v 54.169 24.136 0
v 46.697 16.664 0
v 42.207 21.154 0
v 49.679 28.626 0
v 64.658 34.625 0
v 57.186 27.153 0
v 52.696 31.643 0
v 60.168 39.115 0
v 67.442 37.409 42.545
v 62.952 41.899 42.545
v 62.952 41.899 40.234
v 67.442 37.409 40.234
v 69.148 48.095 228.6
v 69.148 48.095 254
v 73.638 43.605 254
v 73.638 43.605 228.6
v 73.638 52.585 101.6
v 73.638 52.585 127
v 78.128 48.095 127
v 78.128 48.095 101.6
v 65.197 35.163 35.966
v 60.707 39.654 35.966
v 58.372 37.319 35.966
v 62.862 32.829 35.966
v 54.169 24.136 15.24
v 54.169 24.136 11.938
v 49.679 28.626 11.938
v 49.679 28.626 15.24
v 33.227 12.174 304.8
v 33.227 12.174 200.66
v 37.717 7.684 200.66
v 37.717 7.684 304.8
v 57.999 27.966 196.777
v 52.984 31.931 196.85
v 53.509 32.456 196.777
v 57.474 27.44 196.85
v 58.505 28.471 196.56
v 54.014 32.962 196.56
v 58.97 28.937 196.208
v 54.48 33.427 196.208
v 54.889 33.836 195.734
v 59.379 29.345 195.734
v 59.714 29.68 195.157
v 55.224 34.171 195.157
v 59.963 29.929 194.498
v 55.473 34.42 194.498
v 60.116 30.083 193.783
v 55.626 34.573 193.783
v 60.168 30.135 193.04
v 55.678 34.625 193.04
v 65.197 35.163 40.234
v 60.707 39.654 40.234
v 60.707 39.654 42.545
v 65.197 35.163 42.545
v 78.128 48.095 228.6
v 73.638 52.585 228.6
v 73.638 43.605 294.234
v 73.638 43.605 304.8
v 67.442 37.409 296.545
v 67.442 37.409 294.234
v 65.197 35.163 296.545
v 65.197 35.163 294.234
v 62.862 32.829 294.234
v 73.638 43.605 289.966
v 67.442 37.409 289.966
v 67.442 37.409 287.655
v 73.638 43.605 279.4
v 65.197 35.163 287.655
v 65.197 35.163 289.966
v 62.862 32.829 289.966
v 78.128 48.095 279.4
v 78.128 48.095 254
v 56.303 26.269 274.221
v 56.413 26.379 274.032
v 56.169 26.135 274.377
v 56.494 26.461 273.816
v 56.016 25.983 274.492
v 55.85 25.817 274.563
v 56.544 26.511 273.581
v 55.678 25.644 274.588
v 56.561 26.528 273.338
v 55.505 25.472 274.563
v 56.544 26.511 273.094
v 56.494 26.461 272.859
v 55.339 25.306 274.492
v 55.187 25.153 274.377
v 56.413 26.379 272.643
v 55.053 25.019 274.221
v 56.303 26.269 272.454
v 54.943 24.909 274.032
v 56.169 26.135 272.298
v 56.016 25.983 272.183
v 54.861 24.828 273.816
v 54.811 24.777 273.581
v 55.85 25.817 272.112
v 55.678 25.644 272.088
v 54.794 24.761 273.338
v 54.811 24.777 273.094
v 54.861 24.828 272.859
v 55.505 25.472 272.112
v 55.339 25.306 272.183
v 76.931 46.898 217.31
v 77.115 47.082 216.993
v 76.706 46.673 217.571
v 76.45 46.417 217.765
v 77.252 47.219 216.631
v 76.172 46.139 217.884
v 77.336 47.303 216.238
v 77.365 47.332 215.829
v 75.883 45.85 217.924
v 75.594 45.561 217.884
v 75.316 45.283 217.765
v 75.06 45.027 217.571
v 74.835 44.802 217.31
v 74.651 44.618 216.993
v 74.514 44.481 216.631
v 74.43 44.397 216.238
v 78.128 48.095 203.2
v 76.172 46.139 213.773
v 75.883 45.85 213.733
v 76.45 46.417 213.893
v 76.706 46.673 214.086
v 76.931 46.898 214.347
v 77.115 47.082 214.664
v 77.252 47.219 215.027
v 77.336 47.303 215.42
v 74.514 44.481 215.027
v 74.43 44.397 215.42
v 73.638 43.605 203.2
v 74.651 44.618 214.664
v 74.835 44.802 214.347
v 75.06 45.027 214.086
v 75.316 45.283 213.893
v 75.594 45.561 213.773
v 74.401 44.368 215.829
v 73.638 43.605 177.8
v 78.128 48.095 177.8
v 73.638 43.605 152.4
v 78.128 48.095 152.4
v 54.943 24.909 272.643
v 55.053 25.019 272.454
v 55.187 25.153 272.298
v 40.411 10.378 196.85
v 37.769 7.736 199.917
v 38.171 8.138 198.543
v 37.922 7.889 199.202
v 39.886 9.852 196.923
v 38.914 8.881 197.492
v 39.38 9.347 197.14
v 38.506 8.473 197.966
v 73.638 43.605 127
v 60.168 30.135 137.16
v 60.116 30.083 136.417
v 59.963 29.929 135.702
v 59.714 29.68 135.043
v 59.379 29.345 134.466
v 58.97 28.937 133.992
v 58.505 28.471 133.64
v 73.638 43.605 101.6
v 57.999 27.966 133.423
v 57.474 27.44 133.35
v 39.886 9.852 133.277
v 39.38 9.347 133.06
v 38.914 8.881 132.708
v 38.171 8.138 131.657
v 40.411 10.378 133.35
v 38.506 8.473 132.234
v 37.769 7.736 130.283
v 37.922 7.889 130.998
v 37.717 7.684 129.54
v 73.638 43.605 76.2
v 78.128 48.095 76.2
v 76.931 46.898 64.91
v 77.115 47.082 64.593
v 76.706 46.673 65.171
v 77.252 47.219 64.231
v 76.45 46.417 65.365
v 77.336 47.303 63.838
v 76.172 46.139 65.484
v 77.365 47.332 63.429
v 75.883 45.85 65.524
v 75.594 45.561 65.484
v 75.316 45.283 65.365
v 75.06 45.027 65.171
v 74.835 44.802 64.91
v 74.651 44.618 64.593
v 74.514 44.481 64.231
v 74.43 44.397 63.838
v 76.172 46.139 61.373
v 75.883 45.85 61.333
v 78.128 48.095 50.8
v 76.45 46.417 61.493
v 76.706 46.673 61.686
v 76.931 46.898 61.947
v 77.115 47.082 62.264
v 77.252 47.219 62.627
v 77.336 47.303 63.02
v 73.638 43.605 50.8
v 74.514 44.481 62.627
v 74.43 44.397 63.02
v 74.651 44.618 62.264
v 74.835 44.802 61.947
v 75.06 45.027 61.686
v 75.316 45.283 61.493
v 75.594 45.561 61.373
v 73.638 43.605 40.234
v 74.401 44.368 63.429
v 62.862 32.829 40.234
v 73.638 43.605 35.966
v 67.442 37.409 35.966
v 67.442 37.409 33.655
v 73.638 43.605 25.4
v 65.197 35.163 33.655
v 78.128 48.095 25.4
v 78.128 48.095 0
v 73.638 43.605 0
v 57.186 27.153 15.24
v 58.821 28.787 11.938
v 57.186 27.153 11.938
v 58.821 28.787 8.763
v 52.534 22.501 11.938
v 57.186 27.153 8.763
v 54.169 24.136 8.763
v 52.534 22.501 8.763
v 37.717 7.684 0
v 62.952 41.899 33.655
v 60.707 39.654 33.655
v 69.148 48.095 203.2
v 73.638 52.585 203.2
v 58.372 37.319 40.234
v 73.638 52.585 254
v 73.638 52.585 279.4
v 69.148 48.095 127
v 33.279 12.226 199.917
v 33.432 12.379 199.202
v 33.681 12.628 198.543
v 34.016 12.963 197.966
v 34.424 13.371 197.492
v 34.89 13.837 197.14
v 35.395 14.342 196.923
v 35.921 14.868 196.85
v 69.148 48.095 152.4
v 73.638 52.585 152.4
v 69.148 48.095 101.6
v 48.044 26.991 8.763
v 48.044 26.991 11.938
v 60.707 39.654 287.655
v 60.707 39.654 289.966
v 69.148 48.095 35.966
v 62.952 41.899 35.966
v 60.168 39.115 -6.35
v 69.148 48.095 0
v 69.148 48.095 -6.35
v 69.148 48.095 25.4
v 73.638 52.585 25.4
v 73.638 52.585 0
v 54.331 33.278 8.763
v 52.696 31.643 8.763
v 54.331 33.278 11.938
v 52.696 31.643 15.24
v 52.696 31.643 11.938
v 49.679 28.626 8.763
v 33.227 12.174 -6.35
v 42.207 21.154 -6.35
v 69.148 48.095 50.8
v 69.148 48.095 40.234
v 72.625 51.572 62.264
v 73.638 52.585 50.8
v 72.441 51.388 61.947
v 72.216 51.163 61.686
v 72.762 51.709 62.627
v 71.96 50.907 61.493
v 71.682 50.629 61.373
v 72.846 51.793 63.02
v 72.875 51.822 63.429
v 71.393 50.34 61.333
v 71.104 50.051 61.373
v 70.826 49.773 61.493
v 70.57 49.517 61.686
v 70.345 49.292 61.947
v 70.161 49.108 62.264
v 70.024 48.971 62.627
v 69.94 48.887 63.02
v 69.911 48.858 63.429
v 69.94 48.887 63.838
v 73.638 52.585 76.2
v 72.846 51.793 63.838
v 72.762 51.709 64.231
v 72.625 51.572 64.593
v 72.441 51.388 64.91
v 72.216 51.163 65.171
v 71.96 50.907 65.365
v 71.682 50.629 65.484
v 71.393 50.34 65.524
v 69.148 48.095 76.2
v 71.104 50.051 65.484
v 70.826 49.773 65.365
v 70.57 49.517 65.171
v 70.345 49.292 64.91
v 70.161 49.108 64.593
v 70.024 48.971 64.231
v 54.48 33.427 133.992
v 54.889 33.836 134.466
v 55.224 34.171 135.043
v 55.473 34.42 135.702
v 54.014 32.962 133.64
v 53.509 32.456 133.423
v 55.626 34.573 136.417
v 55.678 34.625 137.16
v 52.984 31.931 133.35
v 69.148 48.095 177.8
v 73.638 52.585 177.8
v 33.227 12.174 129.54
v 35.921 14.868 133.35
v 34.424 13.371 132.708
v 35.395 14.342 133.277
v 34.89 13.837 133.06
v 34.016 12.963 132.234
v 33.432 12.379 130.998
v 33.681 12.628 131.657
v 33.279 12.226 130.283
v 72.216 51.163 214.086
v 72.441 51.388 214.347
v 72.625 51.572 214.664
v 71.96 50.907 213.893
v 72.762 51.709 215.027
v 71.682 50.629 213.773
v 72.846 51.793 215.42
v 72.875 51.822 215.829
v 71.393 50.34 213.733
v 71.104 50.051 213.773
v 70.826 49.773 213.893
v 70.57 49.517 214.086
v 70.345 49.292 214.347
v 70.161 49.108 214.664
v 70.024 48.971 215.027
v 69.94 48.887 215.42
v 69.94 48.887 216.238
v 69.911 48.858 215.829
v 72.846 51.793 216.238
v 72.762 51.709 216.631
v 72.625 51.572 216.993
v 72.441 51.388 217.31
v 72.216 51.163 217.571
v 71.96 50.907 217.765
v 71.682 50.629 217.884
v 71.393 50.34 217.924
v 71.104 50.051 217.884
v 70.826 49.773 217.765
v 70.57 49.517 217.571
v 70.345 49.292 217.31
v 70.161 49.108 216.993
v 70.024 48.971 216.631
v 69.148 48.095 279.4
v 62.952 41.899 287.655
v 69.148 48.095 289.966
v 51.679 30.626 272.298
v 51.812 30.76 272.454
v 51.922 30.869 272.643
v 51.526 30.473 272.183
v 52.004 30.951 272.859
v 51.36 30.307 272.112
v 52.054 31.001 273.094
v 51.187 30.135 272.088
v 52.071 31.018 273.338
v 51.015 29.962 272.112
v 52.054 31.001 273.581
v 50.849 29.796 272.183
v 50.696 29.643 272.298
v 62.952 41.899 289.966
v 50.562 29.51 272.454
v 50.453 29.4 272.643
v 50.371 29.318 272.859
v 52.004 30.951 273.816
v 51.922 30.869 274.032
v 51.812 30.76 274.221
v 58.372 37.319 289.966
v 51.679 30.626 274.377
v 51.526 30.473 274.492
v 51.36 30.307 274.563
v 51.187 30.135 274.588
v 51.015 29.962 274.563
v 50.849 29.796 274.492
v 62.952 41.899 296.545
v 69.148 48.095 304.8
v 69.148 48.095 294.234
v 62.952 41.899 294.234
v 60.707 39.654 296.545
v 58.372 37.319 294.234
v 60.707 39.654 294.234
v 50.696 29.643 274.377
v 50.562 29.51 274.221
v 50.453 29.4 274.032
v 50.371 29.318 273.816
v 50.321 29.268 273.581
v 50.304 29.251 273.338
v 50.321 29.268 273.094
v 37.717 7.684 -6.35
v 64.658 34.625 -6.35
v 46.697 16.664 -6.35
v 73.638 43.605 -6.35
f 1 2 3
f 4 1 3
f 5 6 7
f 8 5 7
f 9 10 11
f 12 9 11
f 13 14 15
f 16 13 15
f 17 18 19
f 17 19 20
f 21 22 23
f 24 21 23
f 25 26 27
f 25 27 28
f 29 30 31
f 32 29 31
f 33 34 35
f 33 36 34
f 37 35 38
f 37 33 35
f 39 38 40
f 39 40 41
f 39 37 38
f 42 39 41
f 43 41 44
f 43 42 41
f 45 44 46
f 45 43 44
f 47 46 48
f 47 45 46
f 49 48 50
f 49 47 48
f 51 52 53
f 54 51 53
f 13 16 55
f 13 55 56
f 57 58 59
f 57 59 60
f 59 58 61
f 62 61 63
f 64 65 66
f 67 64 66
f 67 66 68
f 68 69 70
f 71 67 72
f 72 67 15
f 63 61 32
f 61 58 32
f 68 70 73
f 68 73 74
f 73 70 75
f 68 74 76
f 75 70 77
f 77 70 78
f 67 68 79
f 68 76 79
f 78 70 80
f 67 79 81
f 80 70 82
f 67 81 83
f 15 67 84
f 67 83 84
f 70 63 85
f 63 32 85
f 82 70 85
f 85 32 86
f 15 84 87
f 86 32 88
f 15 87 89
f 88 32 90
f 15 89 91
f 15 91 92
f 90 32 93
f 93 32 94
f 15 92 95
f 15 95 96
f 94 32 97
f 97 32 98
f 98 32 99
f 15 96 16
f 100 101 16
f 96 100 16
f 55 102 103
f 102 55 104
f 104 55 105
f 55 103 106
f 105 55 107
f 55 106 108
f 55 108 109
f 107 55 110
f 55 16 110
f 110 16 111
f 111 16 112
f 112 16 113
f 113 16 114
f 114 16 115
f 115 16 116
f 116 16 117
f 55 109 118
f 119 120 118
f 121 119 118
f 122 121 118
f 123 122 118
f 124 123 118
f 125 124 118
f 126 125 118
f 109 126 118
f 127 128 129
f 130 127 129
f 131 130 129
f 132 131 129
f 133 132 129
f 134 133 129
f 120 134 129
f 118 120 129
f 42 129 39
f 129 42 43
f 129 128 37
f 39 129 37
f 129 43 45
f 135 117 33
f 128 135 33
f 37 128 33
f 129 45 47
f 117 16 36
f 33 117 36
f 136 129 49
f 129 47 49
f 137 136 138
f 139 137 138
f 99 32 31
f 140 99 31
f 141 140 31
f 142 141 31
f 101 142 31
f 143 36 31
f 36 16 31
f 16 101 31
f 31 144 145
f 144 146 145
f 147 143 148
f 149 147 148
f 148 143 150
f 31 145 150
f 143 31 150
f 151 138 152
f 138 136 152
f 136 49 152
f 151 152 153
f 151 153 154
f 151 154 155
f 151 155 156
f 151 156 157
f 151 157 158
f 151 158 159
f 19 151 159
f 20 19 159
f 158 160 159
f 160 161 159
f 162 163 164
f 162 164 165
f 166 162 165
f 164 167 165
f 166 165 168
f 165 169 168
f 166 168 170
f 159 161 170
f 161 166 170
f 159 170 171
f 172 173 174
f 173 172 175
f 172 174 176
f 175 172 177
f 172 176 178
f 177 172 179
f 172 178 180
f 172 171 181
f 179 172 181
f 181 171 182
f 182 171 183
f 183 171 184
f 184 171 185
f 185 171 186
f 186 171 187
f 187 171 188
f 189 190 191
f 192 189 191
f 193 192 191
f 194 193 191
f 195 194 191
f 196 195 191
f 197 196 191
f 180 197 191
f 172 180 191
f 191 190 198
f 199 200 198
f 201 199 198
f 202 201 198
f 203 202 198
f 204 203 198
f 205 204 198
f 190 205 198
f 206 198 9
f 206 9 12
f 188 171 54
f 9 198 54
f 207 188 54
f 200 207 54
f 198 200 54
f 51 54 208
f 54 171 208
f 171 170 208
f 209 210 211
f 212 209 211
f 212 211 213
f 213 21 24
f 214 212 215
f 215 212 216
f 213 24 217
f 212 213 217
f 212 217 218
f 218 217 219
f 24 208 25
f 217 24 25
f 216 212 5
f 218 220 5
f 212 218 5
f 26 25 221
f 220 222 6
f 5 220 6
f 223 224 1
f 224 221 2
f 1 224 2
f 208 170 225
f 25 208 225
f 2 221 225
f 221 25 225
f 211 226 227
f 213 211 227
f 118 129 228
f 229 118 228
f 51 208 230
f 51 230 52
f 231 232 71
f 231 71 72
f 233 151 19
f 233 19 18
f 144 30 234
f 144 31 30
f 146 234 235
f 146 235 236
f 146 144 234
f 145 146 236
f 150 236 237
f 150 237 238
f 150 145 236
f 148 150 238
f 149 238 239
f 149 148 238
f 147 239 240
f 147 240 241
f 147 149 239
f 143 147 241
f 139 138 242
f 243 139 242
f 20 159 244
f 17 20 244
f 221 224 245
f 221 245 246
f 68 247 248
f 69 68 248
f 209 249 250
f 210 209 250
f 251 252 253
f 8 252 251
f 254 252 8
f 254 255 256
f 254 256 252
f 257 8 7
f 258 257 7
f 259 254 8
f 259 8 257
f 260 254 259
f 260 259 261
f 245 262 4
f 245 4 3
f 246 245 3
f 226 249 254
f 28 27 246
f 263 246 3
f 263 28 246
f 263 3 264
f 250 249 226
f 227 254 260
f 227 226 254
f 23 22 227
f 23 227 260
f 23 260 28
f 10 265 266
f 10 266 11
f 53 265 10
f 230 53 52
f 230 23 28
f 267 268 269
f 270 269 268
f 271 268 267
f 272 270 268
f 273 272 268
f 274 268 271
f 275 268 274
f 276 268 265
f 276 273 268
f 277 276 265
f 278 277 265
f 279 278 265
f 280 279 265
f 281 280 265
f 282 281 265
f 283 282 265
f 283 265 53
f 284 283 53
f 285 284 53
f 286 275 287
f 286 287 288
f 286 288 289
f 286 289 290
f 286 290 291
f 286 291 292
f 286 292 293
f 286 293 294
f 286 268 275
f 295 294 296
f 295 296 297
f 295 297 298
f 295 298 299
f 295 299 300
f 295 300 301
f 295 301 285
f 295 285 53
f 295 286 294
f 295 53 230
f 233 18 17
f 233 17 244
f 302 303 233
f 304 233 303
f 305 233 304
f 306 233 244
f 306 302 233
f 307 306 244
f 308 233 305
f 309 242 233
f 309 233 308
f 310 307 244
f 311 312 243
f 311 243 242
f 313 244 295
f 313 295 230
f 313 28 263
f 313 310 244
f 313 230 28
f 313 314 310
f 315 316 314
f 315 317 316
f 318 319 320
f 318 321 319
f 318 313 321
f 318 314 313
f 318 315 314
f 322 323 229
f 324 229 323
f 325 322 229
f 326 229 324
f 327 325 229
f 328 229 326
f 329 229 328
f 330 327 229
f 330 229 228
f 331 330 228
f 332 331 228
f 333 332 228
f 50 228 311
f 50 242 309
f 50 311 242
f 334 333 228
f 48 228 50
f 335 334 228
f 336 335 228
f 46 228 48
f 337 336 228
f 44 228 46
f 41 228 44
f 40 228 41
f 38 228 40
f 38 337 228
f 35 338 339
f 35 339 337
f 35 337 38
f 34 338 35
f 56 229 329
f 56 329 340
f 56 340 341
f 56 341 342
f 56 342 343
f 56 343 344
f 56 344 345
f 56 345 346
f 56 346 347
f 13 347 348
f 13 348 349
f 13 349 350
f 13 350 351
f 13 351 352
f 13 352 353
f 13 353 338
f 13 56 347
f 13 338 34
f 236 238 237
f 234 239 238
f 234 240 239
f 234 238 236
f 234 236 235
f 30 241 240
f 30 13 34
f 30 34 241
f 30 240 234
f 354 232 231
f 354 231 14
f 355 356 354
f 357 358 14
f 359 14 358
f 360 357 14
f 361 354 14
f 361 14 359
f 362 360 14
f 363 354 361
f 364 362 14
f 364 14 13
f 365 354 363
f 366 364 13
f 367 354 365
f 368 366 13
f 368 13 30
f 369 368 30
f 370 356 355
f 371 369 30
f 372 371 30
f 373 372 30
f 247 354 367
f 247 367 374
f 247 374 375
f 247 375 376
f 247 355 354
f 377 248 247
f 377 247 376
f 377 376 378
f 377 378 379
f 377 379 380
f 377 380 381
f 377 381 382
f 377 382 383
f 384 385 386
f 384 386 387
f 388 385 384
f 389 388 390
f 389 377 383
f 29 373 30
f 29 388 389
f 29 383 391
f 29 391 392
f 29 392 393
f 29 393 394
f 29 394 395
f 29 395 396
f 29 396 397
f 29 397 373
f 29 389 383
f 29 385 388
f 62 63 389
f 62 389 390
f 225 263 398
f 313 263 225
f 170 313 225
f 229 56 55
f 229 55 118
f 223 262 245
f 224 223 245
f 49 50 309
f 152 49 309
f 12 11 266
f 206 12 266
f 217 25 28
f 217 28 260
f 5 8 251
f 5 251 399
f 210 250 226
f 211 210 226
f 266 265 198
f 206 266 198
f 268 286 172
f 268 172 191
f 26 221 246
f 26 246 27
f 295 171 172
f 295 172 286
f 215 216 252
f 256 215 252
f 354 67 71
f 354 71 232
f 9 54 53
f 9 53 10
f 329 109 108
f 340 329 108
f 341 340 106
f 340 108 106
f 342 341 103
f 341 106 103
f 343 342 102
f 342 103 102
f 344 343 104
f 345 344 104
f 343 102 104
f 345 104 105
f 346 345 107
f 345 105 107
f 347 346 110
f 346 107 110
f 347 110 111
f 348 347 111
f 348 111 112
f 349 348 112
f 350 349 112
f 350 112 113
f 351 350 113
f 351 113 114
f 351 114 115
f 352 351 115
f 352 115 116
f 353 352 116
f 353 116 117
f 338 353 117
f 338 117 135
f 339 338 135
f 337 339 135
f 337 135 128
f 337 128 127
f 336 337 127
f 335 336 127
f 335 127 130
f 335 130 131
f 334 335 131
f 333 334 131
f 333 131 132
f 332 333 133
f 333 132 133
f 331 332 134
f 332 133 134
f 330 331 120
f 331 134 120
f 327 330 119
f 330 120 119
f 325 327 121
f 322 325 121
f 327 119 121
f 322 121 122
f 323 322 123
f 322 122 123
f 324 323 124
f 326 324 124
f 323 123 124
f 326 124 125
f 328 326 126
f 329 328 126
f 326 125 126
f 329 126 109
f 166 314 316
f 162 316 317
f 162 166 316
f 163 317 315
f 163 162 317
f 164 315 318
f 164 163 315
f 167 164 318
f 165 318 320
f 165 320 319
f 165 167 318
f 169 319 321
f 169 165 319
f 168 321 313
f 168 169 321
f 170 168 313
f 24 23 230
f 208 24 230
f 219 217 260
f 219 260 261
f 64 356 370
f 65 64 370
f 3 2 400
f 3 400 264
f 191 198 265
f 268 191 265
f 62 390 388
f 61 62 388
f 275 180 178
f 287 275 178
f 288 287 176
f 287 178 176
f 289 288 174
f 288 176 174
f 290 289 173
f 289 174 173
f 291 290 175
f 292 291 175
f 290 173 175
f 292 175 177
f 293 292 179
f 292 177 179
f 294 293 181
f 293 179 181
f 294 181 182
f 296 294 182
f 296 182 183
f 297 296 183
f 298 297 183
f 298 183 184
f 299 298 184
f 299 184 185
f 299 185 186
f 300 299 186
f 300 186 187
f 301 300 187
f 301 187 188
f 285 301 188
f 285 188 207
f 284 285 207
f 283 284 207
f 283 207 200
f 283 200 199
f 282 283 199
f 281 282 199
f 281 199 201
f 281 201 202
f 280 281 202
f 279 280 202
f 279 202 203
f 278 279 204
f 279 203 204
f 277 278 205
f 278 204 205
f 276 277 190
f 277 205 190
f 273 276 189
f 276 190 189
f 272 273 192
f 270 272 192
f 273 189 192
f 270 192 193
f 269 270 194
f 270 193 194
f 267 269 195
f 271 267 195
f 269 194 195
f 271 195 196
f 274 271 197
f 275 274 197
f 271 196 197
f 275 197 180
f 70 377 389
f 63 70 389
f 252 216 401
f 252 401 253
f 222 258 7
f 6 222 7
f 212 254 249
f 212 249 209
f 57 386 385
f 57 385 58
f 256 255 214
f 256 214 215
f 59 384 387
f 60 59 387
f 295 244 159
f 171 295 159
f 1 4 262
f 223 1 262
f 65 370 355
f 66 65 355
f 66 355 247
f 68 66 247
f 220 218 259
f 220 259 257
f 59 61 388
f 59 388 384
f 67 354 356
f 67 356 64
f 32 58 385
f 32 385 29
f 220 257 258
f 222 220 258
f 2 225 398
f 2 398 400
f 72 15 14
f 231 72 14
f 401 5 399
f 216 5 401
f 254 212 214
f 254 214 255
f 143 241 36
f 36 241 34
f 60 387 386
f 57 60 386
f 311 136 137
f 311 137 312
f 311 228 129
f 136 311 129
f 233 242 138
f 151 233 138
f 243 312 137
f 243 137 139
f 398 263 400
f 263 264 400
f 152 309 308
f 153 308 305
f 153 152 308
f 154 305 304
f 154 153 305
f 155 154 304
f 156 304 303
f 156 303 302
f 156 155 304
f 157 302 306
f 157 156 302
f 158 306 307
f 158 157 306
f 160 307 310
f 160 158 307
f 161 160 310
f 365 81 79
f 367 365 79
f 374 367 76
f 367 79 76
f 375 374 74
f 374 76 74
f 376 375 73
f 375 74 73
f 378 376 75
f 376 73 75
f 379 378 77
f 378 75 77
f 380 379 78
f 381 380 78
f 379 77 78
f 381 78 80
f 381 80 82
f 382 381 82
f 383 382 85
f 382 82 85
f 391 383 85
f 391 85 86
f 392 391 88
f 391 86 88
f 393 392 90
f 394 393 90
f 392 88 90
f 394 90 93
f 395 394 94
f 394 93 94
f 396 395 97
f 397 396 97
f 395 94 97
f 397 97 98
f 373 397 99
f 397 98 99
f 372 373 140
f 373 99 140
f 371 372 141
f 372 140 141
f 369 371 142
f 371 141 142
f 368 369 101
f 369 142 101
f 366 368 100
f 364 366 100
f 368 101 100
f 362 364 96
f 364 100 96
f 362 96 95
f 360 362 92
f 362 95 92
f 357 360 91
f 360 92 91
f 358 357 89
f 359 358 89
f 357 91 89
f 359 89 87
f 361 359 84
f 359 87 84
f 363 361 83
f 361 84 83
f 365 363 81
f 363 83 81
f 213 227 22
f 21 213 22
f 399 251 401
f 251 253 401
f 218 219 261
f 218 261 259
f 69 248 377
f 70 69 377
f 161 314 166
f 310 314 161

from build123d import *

# Parameters (mm, degrees)
BOSS_EXTRUDE1_DEPTH = 304.8
SKETCH2_W           = 25.4
SKETCH2_H           = 6.35
BOSS_EXTRUDE2_DEPTH = 6.35
LPATTERN1_COUNT     = 6
LPATTERN1_PITCH     = 50.8
SKETCH3_R           = 1.25
CUT_EXTRUDE1_DEPTH  = 6.35
BOSS_EXTRUDE3_DEPTH = 6.35
LPATTERN2_COUNT     = 2
LPATTERN2_PITCH     = 38.1
CUT_EXTRUDE2_DEPTH  = 319.521766414
CUT_EXTRUDE3_DEPTH  = 319.521766414
SKETCH7_R           = 2.0955
CUT_EXTRUDE4_DEPTH  = 319.521766414
SKETCH8_W           = 31.75
SKETCH8_H           = 63.5
CUT_EXTRUDE5_DEPTH  = 319.521766414
FILLET1_R           = 3.81


with BuildPart() as part:
    # Sketch1 → Boss-Extrude1 (new body)
    with BuildSketch(Plane.XY):
        Polygon((37.717075708, 7.683880312), (33.226947648, 12.174008373), (69.147972132, 48.095032857), (73.638100193, 43.604904797), align=None)
    extrude(amount=BOSS_EXTRUDE1_DEPTH)

    # Sketch2 → Boss-Extrude2 (add)
    with BuildSketch(Plane(origin=(58.621502495, 58.621502495, 0), x_dir=(0, 0, -1), z_dir=(0.7071067811865471, 0.7071067811865479, 0))):
        with Locations((-266.7, -18.061676125)):
            Rectangle(SKETCH2_W, SKETCH2_H)
    boss_extrude2 = extrude(amount=BOSS_EXTRUDE2_DEPTH)

    # LPattern1: Boss-Extrude2 ×6
    with Locations(*[(0, 0, -i * LPATTERN1_PITCH) for i in range(1, LPATTERN1_COUNT)]):
        add(boss_extrude2)

    # Sketch3 → Cut-Extrude1 (cut)
    with BuildSketch(Plane(origin=(15.016597698, -15.016597698, 0), x_dir=(0, 0, -1), z_dir=(0.7071067811865396, -0.7071067811865555, 0))):
        with Locations(Location((-273.3375, 57.503323875, 0), (0, 0, 90))):
            Circle(SKETCH3_R)
    extrude(amount=-CUT_EXTRUDE1_DEPTH, mode=Mode.SUBTRACT)

    # Sketch4 → Boss-Extrude3 (add)
    with BuildSketch(Plane(origin=(0, 0, 0), x_dir=(-1, 0, 0), z_dir=(0, 0, -1))):
        Polygon((-33.226947648, 12.174008373), (-37.717075708, 7.683880312), (-46.69733183, 16.664136433), (-42.207203769, 21.154264494), align=None)
    boss_extrude3 = extrude(amount=BOSS_EXTRUDE3_DEPTH)

    # LPattern2: Boss-Extrude3 ×2
    with Locations(*[Vector(0.7071067811865472, 0.7071067811865478, 0) * (i * LPATTERN2_PITCH) for i in range(1, LPATTERN2_COUNT)]):
        add(boss_extrude3)

    # Sketch5 → Cut-Extrude2 (cut, through all)
    with BuildSketch(Plane(origin=(10.526469638, -10.526469638, 0), x_dir=(0.7071067811865537, 0.7071067811865415, 0), z_dir=(-0.7071067811865415, 0.7071067811865537, 0))):
        Polygon((59.636923875, 0), (55.369723875, 0), (55.369723875, -8.763), (53.058323875, -8.763), (53.058323875, -11.938), (55.369723875, -11.938), (55.369723875, -15.24), (59.636923875, -15.24), (59.636923875, -11.938), (61.948323875, -11.938), (61.948323875, -8.763), (59.636923875, -8.763), align=None)
    extrude(amount=-CUT_EXTRUDE2_DEPTH, mode=Mode.SUBTRACT)

    # Sketch6 → Cut-Extrude3 (cut, through all)
    with BuildSketch(Plane(origin=(10.526469638, -10.526469638, 0), x_dir=(0.7071067811865537, 0.7071067811865415, 0), z_dir=(-0.7071067811865415, 0.7071067811865537, 0))):
        Polygon((82.903323875, -294.2336), (82.903323875, -289.9664), (74.140323875, -289.9664), (74.140323875, -287.655), (70.965323875, -287.655), (70.965323875, -289.9664), (67.663323875, -289.9664), (67.663323875, -294.2336), (70.965323875, -294.2336), (70.965323875, -296.545), (74.140323875, -296.545), (74.140323875, -294.2336), align=None)
        Polygon((82.903323875, -40.2336), (82.903323875, -35.9664), (74.140323875, -35.9664), (74.140323875, -33.655), (70.965323875, -33.655), (70.965323875, -35.9664), (67.663323875, -35.9664), (67.663323875, -40.2336), (70.965323875, -40.2336), (70.965323875, -42.545), (74.140323875, -42.545), (74.140323875, -40.2336), align=None)
    extrude(amount=-CUT_EXTRUDE3_DEPTH, mode=Mode.SUBTRACT)

    # Sketch7 → Cut-Extrude4 (cut, through all)
    with BuildSketch(Plane(origin=(15.016597698, -15.016597698, 0), x_dir=(-0.7071067811865553, -0.7071067811865398, 0), z_dir=(0.7071067811865398, -0.7071067811865553, 0))):
        with Locations(Location((-86.078323875, -215.828690193, 0), (0, 0, 180))):
            Circle(SKETCH7_R)
        with Locations(Location((-86.078323875, -63.428690193, 0), (0, 0, 180))):
            Circle(SKETCH7_R)
    extrude(amount=-CUT_EXTRUDE4_DEPTH, mode=Mode.SUBTRACT)

    # Sketch8 → Cut-Extrude5 (cut, through all)
    with BuildSketch(Plane(origin=(10.526469638, -10.526469638, 0), x_dir=(0.7071067811865537, 0.7071067811865415, 0), z_dir=(-0.7071067811865415, 0.7071067811865537, 0))):
        with Locations((47.978323875, -165.1)):
            Rectangle(SKETCH8_W, SKETCH8_H)
    extrude(amount=-CUT_EXTRUDE5_DEPTH, mode=Mode.SUBTRACT)

    # Fillet1
    fillet1_edges = [part.edges().sort_by_distance(p)[0] for p in [
        (35.472011678, 9.928944343, 196.85),
        (35.472011678, 9.928944343, 133.35),
        (57.922651981, 32.379584645, 133.35),
        (57.922651981, 32.379584645, 196.85),
    ]]
    fillet(fillet1_edges, radius=FILLET1_R)


solid = part.part
